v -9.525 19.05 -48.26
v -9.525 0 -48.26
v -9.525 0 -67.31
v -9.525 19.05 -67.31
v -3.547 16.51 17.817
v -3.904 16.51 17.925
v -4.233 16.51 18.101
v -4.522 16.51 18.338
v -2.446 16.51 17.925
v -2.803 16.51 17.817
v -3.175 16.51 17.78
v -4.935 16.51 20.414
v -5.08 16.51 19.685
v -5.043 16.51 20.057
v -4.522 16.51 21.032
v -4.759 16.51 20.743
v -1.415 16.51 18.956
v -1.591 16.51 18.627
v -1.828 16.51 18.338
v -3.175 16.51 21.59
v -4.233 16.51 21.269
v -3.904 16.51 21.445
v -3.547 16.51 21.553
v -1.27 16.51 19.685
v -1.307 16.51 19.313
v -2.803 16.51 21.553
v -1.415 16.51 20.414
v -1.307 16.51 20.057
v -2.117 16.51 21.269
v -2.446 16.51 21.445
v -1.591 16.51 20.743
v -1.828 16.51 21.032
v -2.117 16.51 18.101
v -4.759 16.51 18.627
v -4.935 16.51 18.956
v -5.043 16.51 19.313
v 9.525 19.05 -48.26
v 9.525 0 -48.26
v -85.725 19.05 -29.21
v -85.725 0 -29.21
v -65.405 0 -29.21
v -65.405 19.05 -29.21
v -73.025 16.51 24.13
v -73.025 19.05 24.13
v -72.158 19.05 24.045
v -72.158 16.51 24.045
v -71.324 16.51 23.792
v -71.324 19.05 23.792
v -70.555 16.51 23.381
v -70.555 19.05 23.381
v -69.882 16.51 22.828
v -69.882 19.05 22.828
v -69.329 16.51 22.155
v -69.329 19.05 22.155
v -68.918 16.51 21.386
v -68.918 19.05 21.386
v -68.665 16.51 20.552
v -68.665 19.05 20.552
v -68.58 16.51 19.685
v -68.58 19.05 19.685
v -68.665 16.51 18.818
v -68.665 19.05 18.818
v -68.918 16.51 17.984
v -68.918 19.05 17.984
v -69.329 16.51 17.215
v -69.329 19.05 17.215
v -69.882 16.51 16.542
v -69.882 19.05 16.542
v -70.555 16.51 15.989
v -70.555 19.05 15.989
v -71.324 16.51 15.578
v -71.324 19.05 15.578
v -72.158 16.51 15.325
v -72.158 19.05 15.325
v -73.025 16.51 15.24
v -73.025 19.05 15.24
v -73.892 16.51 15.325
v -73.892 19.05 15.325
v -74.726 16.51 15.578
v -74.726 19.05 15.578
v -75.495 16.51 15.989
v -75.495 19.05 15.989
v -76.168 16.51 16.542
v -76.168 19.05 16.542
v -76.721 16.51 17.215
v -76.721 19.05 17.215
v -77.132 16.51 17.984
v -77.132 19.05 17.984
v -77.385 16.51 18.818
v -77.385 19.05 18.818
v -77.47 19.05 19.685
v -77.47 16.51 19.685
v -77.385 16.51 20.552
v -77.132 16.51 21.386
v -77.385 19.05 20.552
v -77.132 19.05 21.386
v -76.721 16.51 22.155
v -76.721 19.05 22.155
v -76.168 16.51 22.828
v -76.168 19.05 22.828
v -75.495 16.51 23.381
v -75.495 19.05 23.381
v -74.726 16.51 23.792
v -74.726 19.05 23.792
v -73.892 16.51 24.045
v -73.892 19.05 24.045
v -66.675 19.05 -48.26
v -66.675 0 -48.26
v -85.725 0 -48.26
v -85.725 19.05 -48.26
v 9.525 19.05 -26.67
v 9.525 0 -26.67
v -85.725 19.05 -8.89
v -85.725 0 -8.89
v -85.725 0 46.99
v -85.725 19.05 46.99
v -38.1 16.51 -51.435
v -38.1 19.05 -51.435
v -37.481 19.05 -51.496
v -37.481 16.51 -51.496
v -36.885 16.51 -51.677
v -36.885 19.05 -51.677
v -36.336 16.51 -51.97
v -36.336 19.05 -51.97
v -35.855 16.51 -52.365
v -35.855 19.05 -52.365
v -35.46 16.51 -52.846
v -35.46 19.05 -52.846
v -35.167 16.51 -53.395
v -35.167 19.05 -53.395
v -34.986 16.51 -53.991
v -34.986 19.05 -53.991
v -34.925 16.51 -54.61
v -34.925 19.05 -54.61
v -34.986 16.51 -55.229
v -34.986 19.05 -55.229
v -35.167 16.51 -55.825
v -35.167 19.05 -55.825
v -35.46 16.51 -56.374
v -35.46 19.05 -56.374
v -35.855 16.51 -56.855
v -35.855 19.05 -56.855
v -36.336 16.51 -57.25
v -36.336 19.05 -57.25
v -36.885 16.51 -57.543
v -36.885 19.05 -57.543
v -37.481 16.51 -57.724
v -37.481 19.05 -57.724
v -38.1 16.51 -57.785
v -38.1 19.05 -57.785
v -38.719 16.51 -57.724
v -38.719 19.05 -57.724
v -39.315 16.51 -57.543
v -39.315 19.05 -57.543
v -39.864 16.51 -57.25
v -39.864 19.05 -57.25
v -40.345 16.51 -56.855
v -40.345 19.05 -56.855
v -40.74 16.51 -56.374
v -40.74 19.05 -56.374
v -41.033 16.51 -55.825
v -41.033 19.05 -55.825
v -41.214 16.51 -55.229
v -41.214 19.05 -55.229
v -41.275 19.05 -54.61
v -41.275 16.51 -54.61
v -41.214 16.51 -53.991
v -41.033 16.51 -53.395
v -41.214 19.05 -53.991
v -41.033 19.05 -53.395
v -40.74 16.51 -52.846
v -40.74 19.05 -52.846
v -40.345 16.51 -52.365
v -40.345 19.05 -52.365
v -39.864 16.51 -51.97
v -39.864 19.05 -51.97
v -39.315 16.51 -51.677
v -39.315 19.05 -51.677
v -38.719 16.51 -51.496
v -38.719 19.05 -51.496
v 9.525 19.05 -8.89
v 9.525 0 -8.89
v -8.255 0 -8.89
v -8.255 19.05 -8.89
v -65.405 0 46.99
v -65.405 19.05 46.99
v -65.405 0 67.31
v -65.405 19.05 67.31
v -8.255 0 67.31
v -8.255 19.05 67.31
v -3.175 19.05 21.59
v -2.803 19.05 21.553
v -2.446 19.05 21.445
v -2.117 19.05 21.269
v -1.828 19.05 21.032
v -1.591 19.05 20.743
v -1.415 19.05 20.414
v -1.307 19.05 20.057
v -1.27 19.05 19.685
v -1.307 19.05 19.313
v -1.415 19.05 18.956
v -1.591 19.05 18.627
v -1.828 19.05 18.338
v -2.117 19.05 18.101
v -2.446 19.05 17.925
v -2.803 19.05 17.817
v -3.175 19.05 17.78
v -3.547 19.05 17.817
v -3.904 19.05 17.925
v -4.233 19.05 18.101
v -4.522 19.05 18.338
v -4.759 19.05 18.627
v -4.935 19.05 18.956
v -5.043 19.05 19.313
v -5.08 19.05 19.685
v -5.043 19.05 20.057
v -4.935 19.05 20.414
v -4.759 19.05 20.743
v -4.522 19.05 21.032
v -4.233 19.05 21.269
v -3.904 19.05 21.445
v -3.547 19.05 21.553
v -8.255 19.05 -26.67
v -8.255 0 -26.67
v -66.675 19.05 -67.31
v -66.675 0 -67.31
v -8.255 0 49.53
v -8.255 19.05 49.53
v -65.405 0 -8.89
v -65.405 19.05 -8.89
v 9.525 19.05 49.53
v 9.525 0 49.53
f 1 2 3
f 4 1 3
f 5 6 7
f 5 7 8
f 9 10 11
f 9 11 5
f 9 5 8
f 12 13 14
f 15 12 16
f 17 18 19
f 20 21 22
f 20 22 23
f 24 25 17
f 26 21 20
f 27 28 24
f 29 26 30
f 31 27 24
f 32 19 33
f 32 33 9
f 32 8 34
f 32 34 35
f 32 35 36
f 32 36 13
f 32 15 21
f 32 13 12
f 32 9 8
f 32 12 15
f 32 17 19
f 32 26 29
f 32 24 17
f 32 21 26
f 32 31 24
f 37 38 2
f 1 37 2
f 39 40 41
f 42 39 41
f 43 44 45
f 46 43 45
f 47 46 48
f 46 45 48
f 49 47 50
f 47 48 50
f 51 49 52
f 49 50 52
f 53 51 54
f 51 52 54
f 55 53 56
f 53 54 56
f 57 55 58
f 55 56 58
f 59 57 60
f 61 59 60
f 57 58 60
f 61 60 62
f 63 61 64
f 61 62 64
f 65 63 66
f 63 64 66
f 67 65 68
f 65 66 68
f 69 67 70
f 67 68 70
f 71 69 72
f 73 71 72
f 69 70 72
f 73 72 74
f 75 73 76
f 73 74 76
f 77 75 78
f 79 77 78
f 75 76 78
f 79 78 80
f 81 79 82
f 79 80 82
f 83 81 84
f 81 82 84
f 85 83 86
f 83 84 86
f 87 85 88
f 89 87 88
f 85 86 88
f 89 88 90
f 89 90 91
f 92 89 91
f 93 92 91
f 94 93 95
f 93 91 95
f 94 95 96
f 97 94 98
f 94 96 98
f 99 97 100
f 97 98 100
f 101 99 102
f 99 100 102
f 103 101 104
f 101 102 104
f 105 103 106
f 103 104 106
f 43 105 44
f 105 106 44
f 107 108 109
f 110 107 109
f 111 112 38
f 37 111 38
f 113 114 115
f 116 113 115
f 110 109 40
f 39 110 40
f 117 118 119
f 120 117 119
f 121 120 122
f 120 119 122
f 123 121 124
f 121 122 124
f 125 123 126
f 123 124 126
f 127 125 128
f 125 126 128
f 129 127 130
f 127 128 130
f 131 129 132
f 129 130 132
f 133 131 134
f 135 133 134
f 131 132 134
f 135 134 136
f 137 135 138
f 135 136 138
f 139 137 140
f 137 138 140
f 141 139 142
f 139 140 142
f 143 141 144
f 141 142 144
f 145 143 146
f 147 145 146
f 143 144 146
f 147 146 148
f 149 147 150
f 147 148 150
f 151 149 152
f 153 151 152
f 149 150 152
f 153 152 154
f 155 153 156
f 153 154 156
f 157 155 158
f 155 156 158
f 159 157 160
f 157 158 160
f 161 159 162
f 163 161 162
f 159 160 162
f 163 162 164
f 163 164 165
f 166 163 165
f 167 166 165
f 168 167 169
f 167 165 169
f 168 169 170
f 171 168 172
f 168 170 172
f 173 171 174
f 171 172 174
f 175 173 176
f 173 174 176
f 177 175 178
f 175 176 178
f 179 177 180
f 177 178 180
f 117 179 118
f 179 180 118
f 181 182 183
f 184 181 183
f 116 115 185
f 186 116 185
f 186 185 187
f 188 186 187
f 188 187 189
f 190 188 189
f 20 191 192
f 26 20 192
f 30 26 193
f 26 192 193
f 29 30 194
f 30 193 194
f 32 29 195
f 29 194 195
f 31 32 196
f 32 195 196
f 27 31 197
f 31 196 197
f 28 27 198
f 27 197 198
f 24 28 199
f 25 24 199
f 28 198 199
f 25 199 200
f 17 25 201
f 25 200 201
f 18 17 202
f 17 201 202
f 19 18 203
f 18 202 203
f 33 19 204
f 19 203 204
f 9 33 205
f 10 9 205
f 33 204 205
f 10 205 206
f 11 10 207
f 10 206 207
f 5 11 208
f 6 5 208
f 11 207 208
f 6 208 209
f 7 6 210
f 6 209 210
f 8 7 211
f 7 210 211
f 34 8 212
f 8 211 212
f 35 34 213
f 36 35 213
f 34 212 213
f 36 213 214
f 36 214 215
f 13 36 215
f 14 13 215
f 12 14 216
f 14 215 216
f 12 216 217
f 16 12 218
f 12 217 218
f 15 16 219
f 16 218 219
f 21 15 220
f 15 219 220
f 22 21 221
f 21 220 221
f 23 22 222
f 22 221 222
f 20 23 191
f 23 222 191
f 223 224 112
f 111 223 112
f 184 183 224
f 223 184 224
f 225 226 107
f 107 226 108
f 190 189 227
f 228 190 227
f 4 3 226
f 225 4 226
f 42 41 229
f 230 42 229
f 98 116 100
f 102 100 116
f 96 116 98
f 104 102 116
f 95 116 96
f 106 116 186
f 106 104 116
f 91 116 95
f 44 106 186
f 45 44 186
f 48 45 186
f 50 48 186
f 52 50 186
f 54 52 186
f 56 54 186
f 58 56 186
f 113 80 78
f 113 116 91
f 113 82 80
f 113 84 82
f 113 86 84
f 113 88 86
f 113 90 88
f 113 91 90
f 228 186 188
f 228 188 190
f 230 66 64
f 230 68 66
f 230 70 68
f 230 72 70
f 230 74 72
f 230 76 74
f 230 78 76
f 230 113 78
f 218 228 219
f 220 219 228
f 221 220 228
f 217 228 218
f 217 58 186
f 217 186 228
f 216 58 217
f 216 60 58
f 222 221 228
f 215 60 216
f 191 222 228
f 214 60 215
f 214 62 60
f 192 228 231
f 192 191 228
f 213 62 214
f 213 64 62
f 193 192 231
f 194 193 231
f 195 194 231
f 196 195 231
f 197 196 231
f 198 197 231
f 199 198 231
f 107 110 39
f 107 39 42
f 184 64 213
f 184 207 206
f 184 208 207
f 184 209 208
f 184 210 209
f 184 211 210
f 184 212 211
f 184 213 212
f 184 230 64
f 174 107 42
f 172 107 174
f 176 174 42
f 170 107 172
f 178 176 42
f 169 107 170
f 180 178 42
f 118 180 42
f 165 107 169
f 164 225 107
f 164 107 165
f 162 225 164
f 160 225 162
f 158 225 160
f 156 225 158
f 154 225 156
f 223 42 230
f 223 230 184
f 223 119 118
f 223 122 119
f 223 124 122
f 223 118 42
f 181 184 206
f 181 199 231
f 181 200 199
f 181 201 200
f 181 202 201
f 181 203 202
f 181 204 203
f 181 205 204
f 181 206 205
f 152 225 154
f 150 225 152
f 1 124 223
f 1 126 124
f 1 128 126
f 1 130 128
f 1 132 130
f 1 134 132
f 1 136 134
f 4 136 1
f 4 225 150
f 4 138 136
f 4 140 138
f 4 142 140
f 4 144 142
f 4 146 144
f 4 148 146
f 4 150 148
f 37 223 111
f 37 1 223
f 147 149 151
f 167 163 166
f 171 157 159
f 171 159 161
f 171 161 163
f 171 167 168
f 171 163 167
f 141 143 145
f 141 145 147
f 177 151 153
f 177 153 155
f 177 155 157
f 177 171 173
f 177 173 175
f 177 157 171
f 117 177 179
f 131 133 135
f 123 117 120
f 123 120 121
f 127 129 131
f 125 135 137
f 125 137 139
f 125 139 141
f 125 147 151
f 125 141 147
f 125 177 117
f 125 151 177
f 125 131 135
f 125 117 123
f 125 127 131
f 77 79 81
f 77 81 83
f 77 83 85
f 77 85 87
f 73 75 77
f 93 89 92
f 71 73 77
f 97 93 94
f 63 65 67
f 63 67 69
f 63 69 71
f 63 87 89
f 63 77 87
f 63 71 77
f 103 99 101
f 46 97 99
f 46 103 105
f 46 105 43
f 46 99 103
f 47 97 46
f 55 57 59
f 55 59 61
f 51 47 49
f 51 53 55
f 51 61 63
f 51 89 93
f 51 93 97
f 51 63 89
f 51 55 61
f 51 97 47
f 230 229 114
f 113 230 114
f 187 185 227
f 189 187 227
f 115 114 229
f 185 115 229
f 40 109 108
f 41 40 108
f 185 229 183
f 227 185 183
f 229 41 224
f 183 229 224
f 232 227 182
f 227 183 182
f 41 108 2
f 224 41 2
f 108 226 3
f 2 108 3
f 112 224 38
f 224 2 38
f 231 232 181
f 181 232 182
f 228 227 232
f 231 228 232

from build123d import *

# Parameters (mm, degrees)
BOSS_EXTRUDE1_DEPTH = 19.05
SKETCH2_R           = 1.905
SKETCH2_R_2         = 4.445
SKETCH2_R_3         = 3.175
CUT_EXTRUDE1_DEPTH  = 2.54


with BuildPart() as part:
    # Sketch1 → Boss-Extrude1 (new body)
    with BuildSketch(Plane(origin=(0, 0, 0), x_dir=(1, 0, 0), z_dir=(0, 1, 0))):
        Polygon((-9.525, 48.26), (-9.525, 67.31), (-66.675, 67.31), (-66.675, 48.26), (-85.725, 48.26), (-85.725, 29.21), (-65.405, 29.21), (-65.405, 8.89), (-85.725, 8.89), (-85.725, -46.99), (-65.405, -46.99), (-65.405, -67.31), (-8.255, -67.31), (-8.255, -49.53), (9.525, -49.53), (9.525, 8.89), (-8.255, 8.89), (-8.255, 26.67), (9.525, 26.67), (9.525, 48.26), align=None)
    extrude(amount=BOSS_EXTRUDE1_DEPTH)

    # Sketch2 → Cut-Extrude1 (cut)
    with BuildSketch(Plane(origin=(0, 19.05, 0), x_dir=(1, 0, 0), z_dir=(0, 1, 0))):
        with Locations(Location((-3.175, -19.685, 0), (0, 0, 270))):
            Circle(SKETCH2_R)
        with Locations(Location((-73.025, -19.685, 0), (0, 0, 270))):
            Circle(SKETCH2_R_2)
        with Locations(Location((-38.1, 54.61, 0), (0, 0, 270))):
            Circle(SKETCH2_R_3)
    extrude(amount=-CUT_EXTRUDE1_DEPTH, mode=Mode.SUBTRACT)


solid = part.part
